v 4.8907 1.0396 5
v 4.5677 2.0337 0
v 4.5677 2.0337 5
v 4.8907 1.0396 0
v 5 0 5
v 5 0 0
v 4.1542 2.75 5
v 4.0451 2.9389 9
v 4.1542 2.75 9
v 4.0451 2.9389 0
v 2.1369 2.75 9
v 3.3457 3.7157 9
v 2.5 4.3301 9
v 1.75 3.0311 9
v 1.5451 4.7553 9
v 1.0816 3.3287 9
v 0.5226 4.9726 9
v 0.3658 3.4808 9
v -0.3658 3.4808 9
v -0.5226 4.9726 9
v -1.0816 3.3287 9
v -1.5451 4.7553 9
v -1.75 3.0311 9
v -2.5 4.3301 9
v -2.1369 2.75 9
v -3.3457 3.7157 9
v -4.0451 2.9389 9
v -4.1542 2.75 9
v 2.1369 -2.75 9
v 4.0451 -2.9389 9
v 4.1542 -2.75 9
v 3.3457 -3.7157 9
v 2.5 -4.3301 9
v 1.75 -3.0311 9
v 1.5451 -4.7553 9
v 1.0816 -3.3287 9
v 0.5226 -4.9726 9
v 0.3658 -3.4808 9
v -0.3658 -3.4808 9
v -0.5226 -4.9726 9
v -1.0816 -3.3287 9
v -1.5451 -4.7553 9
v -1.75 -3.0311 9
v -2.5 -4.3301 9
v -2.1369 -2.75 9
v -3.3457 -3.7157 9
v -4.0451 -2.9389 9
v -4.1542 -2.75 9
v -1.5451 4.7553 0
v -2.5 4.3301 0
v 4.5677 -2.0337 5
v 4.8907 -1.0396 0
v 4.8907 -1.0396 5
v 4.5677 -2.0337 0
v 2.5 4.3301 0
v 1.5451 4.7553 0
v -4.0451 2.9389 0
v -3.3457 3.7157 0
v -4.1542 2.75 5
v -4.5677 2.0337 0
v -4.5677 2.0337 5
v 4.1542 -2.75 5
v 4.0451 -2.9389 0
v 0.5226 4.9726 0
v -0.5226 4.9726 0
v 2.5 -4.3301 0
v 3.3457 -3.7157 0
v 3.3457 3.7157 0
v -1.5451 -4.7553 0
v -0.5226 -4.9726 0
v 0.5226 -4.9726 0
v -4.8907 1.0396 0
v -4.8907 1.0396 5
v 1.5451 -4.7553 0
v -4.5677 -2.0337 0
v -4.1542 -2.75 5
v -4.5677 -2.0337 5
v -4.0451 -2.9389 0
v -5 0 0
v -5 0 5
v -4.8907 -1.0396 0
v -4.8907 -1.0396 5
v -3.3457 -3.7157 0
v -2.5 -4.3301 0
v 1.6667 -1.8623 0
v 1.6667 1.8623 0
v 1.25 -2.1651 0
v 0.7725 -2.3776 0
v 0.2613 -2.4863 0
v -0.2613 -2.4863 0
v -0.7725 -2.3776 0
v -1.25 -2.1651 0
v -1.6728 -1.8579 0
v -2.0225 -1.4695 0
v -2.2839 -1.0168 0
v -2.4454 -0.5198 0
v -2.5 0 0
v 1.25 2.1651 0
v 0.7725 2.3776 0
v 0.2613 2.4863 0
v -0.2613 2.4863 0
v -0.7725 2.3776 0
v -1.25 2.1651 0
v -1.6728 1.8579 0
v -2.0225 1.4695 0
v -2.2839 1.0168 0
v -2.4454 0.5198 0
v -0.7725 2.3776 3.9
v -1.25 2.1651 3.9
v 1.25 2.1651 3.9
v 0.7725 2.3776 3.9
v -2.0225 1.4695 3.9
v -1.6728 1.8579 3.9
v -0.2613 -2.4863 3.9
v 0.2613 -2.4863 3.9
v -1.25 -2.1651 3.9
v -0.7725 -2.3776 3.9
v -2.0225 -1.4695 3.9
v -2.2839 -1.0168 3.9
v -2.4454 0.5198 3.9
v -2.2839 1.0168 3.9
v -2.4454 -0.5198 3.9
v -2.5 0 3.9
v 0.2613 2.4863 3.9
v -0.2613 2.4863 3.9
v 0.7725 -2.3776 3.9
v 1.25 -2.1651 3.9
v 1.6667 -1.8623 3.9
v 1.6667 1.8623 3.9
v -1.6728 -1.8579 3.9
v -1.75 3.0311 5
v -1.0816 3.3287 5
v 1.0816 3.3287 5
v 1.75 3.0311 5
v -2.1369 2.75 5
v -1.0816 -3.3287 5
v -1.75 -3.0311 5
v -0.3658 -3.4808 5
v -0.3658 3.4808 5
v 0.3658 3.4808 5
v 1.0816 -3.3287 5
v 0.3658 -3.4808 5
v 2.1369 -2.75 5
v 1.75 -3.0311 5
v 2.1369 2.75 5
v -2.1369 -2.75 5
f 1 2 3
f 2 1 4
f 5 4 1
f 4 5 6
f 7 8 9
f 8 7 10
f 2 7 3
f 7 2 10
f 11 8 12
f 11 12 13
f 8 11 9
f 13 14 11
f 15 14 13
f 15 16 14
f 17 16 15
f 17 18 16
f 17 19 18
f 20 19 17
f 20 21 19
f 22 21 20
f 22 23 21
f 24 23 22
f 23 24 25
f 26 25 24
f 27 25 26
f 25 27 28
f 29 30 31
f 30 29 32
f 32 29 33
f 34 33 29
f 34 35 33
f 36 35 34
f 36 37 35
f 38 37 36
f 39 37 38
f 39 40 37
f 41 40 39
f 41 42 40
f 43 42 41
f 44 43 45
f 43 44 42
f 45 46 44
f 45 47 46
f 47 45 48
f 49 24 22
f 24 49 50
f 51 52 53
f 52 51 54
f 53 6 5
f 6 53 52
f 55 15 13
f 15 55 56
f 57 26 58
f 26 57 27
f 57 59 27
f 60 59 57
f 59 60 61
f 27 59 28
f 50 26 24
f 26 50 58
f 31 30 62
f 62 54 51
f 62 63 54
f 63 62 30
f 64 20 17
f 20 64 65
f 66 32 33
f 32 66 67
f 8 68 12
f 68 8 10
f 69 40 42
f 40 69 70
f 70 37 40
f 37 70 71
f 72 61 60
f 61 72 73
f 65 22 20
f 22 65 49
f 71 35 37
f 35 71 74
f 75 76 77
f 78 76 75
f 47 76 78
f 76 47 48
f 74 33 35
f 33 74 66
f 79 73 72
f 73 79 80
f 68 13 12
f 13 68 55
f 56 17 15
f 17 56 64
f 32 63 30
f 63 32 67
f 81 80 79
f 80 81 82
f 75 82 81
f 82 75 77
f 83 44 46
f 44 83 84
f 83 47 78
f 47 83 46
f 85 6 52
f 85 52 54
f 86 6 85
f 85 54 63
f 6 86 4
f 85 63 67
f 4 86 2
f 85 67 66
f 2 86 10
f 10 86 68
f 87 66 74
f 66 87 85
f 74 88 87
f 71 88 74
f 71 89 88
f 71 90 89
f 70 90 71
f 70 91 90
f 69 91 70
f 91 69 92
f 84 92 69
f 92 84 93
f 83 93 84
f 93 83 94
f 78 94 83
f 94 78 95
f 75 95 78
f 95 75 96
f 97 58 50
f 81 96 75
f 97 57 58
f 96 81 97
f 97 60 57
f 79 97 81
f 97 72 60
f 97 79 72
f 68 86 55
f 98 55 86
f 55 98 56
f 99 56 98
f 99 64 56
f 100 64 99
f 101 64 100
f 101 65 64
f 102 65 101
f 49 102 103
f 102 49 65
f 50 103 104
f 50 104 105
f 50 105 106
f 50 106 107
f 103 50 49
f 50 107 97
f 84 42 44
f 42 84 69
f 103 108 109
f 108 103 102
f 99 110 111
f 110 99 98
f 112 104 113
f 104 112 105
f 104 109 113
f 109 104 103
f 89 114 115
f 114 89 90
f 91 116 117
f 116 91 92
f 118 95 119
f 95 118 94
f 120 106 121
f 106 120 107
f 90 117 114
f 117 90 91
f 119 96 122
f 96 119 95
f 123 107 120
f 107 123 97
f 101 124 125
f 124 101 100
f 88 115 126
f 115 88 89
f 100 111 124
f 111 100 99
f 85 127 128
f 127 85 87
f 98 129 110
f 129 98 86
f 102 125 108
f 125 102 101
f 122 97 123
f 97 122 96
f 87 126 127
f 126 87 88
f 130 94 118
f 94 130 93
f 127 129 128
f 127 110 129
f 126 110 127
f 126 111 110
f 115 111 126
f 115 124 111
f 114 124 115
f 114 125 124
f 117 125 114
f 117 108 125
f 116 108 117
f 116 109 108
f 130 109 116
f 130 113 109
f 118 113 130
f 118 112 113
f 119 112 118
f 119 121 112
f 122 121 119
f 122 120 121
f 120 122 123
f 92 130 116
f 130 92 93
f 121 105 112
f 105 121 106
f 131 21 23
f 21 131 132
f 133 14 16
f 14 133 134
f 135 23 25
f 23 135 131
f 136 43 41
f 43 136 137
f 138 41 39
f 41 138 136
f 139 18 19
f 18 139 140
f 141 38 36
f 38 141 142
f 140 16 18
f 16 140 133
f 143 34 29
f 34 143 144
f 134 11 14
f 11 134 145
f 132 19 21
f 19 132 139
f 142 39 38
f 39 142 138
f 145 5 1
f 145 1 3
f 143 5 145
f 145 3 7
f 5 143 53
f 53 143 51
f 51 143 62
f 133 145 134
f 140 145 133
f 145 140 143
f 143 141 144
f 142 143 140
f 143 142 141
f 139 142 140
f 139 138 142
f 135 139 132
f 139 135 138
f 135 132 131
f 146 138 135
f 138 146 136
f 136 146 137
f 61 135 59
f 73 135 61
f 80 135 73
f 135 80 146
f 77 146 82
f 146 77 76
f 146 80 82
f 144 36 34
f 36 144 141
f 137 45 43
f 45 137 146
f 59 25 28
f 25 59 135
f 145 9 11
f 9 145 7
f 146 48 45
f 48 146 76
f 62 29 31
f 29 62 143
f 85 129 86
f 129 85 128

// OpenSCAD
$fn=30;

prong_dia = 5;
servo_arm_dia = 7;


wall_thickness = 1.5;
component_dia = servo_arm_dia + 2*wall_thickness;
component_depth = 9;

cutaway_block_size = 5.5;
cutaway_depth = 4;

difference(){
    cylinder(d=component_dia,component_depth);

    translate([0,0,-.1]){
        cylinder(d=prong_dia,cutaway_depth);
    }
    translate([0,0,cutaway_depth+1]){
        cylinder(d=servo_arm_dia, 10);
    }
    translate([0,0,cutaway_depth + 1 +
               (component_depth-cutaway_depth)/2]){
    cube([
          20,
          cutaway_block_size,
          component_depth-cutaway_depth
         ],
        center=true);
}
}




difference(){
    translate([5/6*prong_dia,0,cutaway_depth/2])
    cube([prong_dia, prong_dia, cutaway_depth], center=true);
    
    difference(){
    translate([0,0,-2])
    cylinder(d=50, 20);
    translate([0,0,0])
    cylinder(d=prong_dia,cutaway_depth);
    }
}
